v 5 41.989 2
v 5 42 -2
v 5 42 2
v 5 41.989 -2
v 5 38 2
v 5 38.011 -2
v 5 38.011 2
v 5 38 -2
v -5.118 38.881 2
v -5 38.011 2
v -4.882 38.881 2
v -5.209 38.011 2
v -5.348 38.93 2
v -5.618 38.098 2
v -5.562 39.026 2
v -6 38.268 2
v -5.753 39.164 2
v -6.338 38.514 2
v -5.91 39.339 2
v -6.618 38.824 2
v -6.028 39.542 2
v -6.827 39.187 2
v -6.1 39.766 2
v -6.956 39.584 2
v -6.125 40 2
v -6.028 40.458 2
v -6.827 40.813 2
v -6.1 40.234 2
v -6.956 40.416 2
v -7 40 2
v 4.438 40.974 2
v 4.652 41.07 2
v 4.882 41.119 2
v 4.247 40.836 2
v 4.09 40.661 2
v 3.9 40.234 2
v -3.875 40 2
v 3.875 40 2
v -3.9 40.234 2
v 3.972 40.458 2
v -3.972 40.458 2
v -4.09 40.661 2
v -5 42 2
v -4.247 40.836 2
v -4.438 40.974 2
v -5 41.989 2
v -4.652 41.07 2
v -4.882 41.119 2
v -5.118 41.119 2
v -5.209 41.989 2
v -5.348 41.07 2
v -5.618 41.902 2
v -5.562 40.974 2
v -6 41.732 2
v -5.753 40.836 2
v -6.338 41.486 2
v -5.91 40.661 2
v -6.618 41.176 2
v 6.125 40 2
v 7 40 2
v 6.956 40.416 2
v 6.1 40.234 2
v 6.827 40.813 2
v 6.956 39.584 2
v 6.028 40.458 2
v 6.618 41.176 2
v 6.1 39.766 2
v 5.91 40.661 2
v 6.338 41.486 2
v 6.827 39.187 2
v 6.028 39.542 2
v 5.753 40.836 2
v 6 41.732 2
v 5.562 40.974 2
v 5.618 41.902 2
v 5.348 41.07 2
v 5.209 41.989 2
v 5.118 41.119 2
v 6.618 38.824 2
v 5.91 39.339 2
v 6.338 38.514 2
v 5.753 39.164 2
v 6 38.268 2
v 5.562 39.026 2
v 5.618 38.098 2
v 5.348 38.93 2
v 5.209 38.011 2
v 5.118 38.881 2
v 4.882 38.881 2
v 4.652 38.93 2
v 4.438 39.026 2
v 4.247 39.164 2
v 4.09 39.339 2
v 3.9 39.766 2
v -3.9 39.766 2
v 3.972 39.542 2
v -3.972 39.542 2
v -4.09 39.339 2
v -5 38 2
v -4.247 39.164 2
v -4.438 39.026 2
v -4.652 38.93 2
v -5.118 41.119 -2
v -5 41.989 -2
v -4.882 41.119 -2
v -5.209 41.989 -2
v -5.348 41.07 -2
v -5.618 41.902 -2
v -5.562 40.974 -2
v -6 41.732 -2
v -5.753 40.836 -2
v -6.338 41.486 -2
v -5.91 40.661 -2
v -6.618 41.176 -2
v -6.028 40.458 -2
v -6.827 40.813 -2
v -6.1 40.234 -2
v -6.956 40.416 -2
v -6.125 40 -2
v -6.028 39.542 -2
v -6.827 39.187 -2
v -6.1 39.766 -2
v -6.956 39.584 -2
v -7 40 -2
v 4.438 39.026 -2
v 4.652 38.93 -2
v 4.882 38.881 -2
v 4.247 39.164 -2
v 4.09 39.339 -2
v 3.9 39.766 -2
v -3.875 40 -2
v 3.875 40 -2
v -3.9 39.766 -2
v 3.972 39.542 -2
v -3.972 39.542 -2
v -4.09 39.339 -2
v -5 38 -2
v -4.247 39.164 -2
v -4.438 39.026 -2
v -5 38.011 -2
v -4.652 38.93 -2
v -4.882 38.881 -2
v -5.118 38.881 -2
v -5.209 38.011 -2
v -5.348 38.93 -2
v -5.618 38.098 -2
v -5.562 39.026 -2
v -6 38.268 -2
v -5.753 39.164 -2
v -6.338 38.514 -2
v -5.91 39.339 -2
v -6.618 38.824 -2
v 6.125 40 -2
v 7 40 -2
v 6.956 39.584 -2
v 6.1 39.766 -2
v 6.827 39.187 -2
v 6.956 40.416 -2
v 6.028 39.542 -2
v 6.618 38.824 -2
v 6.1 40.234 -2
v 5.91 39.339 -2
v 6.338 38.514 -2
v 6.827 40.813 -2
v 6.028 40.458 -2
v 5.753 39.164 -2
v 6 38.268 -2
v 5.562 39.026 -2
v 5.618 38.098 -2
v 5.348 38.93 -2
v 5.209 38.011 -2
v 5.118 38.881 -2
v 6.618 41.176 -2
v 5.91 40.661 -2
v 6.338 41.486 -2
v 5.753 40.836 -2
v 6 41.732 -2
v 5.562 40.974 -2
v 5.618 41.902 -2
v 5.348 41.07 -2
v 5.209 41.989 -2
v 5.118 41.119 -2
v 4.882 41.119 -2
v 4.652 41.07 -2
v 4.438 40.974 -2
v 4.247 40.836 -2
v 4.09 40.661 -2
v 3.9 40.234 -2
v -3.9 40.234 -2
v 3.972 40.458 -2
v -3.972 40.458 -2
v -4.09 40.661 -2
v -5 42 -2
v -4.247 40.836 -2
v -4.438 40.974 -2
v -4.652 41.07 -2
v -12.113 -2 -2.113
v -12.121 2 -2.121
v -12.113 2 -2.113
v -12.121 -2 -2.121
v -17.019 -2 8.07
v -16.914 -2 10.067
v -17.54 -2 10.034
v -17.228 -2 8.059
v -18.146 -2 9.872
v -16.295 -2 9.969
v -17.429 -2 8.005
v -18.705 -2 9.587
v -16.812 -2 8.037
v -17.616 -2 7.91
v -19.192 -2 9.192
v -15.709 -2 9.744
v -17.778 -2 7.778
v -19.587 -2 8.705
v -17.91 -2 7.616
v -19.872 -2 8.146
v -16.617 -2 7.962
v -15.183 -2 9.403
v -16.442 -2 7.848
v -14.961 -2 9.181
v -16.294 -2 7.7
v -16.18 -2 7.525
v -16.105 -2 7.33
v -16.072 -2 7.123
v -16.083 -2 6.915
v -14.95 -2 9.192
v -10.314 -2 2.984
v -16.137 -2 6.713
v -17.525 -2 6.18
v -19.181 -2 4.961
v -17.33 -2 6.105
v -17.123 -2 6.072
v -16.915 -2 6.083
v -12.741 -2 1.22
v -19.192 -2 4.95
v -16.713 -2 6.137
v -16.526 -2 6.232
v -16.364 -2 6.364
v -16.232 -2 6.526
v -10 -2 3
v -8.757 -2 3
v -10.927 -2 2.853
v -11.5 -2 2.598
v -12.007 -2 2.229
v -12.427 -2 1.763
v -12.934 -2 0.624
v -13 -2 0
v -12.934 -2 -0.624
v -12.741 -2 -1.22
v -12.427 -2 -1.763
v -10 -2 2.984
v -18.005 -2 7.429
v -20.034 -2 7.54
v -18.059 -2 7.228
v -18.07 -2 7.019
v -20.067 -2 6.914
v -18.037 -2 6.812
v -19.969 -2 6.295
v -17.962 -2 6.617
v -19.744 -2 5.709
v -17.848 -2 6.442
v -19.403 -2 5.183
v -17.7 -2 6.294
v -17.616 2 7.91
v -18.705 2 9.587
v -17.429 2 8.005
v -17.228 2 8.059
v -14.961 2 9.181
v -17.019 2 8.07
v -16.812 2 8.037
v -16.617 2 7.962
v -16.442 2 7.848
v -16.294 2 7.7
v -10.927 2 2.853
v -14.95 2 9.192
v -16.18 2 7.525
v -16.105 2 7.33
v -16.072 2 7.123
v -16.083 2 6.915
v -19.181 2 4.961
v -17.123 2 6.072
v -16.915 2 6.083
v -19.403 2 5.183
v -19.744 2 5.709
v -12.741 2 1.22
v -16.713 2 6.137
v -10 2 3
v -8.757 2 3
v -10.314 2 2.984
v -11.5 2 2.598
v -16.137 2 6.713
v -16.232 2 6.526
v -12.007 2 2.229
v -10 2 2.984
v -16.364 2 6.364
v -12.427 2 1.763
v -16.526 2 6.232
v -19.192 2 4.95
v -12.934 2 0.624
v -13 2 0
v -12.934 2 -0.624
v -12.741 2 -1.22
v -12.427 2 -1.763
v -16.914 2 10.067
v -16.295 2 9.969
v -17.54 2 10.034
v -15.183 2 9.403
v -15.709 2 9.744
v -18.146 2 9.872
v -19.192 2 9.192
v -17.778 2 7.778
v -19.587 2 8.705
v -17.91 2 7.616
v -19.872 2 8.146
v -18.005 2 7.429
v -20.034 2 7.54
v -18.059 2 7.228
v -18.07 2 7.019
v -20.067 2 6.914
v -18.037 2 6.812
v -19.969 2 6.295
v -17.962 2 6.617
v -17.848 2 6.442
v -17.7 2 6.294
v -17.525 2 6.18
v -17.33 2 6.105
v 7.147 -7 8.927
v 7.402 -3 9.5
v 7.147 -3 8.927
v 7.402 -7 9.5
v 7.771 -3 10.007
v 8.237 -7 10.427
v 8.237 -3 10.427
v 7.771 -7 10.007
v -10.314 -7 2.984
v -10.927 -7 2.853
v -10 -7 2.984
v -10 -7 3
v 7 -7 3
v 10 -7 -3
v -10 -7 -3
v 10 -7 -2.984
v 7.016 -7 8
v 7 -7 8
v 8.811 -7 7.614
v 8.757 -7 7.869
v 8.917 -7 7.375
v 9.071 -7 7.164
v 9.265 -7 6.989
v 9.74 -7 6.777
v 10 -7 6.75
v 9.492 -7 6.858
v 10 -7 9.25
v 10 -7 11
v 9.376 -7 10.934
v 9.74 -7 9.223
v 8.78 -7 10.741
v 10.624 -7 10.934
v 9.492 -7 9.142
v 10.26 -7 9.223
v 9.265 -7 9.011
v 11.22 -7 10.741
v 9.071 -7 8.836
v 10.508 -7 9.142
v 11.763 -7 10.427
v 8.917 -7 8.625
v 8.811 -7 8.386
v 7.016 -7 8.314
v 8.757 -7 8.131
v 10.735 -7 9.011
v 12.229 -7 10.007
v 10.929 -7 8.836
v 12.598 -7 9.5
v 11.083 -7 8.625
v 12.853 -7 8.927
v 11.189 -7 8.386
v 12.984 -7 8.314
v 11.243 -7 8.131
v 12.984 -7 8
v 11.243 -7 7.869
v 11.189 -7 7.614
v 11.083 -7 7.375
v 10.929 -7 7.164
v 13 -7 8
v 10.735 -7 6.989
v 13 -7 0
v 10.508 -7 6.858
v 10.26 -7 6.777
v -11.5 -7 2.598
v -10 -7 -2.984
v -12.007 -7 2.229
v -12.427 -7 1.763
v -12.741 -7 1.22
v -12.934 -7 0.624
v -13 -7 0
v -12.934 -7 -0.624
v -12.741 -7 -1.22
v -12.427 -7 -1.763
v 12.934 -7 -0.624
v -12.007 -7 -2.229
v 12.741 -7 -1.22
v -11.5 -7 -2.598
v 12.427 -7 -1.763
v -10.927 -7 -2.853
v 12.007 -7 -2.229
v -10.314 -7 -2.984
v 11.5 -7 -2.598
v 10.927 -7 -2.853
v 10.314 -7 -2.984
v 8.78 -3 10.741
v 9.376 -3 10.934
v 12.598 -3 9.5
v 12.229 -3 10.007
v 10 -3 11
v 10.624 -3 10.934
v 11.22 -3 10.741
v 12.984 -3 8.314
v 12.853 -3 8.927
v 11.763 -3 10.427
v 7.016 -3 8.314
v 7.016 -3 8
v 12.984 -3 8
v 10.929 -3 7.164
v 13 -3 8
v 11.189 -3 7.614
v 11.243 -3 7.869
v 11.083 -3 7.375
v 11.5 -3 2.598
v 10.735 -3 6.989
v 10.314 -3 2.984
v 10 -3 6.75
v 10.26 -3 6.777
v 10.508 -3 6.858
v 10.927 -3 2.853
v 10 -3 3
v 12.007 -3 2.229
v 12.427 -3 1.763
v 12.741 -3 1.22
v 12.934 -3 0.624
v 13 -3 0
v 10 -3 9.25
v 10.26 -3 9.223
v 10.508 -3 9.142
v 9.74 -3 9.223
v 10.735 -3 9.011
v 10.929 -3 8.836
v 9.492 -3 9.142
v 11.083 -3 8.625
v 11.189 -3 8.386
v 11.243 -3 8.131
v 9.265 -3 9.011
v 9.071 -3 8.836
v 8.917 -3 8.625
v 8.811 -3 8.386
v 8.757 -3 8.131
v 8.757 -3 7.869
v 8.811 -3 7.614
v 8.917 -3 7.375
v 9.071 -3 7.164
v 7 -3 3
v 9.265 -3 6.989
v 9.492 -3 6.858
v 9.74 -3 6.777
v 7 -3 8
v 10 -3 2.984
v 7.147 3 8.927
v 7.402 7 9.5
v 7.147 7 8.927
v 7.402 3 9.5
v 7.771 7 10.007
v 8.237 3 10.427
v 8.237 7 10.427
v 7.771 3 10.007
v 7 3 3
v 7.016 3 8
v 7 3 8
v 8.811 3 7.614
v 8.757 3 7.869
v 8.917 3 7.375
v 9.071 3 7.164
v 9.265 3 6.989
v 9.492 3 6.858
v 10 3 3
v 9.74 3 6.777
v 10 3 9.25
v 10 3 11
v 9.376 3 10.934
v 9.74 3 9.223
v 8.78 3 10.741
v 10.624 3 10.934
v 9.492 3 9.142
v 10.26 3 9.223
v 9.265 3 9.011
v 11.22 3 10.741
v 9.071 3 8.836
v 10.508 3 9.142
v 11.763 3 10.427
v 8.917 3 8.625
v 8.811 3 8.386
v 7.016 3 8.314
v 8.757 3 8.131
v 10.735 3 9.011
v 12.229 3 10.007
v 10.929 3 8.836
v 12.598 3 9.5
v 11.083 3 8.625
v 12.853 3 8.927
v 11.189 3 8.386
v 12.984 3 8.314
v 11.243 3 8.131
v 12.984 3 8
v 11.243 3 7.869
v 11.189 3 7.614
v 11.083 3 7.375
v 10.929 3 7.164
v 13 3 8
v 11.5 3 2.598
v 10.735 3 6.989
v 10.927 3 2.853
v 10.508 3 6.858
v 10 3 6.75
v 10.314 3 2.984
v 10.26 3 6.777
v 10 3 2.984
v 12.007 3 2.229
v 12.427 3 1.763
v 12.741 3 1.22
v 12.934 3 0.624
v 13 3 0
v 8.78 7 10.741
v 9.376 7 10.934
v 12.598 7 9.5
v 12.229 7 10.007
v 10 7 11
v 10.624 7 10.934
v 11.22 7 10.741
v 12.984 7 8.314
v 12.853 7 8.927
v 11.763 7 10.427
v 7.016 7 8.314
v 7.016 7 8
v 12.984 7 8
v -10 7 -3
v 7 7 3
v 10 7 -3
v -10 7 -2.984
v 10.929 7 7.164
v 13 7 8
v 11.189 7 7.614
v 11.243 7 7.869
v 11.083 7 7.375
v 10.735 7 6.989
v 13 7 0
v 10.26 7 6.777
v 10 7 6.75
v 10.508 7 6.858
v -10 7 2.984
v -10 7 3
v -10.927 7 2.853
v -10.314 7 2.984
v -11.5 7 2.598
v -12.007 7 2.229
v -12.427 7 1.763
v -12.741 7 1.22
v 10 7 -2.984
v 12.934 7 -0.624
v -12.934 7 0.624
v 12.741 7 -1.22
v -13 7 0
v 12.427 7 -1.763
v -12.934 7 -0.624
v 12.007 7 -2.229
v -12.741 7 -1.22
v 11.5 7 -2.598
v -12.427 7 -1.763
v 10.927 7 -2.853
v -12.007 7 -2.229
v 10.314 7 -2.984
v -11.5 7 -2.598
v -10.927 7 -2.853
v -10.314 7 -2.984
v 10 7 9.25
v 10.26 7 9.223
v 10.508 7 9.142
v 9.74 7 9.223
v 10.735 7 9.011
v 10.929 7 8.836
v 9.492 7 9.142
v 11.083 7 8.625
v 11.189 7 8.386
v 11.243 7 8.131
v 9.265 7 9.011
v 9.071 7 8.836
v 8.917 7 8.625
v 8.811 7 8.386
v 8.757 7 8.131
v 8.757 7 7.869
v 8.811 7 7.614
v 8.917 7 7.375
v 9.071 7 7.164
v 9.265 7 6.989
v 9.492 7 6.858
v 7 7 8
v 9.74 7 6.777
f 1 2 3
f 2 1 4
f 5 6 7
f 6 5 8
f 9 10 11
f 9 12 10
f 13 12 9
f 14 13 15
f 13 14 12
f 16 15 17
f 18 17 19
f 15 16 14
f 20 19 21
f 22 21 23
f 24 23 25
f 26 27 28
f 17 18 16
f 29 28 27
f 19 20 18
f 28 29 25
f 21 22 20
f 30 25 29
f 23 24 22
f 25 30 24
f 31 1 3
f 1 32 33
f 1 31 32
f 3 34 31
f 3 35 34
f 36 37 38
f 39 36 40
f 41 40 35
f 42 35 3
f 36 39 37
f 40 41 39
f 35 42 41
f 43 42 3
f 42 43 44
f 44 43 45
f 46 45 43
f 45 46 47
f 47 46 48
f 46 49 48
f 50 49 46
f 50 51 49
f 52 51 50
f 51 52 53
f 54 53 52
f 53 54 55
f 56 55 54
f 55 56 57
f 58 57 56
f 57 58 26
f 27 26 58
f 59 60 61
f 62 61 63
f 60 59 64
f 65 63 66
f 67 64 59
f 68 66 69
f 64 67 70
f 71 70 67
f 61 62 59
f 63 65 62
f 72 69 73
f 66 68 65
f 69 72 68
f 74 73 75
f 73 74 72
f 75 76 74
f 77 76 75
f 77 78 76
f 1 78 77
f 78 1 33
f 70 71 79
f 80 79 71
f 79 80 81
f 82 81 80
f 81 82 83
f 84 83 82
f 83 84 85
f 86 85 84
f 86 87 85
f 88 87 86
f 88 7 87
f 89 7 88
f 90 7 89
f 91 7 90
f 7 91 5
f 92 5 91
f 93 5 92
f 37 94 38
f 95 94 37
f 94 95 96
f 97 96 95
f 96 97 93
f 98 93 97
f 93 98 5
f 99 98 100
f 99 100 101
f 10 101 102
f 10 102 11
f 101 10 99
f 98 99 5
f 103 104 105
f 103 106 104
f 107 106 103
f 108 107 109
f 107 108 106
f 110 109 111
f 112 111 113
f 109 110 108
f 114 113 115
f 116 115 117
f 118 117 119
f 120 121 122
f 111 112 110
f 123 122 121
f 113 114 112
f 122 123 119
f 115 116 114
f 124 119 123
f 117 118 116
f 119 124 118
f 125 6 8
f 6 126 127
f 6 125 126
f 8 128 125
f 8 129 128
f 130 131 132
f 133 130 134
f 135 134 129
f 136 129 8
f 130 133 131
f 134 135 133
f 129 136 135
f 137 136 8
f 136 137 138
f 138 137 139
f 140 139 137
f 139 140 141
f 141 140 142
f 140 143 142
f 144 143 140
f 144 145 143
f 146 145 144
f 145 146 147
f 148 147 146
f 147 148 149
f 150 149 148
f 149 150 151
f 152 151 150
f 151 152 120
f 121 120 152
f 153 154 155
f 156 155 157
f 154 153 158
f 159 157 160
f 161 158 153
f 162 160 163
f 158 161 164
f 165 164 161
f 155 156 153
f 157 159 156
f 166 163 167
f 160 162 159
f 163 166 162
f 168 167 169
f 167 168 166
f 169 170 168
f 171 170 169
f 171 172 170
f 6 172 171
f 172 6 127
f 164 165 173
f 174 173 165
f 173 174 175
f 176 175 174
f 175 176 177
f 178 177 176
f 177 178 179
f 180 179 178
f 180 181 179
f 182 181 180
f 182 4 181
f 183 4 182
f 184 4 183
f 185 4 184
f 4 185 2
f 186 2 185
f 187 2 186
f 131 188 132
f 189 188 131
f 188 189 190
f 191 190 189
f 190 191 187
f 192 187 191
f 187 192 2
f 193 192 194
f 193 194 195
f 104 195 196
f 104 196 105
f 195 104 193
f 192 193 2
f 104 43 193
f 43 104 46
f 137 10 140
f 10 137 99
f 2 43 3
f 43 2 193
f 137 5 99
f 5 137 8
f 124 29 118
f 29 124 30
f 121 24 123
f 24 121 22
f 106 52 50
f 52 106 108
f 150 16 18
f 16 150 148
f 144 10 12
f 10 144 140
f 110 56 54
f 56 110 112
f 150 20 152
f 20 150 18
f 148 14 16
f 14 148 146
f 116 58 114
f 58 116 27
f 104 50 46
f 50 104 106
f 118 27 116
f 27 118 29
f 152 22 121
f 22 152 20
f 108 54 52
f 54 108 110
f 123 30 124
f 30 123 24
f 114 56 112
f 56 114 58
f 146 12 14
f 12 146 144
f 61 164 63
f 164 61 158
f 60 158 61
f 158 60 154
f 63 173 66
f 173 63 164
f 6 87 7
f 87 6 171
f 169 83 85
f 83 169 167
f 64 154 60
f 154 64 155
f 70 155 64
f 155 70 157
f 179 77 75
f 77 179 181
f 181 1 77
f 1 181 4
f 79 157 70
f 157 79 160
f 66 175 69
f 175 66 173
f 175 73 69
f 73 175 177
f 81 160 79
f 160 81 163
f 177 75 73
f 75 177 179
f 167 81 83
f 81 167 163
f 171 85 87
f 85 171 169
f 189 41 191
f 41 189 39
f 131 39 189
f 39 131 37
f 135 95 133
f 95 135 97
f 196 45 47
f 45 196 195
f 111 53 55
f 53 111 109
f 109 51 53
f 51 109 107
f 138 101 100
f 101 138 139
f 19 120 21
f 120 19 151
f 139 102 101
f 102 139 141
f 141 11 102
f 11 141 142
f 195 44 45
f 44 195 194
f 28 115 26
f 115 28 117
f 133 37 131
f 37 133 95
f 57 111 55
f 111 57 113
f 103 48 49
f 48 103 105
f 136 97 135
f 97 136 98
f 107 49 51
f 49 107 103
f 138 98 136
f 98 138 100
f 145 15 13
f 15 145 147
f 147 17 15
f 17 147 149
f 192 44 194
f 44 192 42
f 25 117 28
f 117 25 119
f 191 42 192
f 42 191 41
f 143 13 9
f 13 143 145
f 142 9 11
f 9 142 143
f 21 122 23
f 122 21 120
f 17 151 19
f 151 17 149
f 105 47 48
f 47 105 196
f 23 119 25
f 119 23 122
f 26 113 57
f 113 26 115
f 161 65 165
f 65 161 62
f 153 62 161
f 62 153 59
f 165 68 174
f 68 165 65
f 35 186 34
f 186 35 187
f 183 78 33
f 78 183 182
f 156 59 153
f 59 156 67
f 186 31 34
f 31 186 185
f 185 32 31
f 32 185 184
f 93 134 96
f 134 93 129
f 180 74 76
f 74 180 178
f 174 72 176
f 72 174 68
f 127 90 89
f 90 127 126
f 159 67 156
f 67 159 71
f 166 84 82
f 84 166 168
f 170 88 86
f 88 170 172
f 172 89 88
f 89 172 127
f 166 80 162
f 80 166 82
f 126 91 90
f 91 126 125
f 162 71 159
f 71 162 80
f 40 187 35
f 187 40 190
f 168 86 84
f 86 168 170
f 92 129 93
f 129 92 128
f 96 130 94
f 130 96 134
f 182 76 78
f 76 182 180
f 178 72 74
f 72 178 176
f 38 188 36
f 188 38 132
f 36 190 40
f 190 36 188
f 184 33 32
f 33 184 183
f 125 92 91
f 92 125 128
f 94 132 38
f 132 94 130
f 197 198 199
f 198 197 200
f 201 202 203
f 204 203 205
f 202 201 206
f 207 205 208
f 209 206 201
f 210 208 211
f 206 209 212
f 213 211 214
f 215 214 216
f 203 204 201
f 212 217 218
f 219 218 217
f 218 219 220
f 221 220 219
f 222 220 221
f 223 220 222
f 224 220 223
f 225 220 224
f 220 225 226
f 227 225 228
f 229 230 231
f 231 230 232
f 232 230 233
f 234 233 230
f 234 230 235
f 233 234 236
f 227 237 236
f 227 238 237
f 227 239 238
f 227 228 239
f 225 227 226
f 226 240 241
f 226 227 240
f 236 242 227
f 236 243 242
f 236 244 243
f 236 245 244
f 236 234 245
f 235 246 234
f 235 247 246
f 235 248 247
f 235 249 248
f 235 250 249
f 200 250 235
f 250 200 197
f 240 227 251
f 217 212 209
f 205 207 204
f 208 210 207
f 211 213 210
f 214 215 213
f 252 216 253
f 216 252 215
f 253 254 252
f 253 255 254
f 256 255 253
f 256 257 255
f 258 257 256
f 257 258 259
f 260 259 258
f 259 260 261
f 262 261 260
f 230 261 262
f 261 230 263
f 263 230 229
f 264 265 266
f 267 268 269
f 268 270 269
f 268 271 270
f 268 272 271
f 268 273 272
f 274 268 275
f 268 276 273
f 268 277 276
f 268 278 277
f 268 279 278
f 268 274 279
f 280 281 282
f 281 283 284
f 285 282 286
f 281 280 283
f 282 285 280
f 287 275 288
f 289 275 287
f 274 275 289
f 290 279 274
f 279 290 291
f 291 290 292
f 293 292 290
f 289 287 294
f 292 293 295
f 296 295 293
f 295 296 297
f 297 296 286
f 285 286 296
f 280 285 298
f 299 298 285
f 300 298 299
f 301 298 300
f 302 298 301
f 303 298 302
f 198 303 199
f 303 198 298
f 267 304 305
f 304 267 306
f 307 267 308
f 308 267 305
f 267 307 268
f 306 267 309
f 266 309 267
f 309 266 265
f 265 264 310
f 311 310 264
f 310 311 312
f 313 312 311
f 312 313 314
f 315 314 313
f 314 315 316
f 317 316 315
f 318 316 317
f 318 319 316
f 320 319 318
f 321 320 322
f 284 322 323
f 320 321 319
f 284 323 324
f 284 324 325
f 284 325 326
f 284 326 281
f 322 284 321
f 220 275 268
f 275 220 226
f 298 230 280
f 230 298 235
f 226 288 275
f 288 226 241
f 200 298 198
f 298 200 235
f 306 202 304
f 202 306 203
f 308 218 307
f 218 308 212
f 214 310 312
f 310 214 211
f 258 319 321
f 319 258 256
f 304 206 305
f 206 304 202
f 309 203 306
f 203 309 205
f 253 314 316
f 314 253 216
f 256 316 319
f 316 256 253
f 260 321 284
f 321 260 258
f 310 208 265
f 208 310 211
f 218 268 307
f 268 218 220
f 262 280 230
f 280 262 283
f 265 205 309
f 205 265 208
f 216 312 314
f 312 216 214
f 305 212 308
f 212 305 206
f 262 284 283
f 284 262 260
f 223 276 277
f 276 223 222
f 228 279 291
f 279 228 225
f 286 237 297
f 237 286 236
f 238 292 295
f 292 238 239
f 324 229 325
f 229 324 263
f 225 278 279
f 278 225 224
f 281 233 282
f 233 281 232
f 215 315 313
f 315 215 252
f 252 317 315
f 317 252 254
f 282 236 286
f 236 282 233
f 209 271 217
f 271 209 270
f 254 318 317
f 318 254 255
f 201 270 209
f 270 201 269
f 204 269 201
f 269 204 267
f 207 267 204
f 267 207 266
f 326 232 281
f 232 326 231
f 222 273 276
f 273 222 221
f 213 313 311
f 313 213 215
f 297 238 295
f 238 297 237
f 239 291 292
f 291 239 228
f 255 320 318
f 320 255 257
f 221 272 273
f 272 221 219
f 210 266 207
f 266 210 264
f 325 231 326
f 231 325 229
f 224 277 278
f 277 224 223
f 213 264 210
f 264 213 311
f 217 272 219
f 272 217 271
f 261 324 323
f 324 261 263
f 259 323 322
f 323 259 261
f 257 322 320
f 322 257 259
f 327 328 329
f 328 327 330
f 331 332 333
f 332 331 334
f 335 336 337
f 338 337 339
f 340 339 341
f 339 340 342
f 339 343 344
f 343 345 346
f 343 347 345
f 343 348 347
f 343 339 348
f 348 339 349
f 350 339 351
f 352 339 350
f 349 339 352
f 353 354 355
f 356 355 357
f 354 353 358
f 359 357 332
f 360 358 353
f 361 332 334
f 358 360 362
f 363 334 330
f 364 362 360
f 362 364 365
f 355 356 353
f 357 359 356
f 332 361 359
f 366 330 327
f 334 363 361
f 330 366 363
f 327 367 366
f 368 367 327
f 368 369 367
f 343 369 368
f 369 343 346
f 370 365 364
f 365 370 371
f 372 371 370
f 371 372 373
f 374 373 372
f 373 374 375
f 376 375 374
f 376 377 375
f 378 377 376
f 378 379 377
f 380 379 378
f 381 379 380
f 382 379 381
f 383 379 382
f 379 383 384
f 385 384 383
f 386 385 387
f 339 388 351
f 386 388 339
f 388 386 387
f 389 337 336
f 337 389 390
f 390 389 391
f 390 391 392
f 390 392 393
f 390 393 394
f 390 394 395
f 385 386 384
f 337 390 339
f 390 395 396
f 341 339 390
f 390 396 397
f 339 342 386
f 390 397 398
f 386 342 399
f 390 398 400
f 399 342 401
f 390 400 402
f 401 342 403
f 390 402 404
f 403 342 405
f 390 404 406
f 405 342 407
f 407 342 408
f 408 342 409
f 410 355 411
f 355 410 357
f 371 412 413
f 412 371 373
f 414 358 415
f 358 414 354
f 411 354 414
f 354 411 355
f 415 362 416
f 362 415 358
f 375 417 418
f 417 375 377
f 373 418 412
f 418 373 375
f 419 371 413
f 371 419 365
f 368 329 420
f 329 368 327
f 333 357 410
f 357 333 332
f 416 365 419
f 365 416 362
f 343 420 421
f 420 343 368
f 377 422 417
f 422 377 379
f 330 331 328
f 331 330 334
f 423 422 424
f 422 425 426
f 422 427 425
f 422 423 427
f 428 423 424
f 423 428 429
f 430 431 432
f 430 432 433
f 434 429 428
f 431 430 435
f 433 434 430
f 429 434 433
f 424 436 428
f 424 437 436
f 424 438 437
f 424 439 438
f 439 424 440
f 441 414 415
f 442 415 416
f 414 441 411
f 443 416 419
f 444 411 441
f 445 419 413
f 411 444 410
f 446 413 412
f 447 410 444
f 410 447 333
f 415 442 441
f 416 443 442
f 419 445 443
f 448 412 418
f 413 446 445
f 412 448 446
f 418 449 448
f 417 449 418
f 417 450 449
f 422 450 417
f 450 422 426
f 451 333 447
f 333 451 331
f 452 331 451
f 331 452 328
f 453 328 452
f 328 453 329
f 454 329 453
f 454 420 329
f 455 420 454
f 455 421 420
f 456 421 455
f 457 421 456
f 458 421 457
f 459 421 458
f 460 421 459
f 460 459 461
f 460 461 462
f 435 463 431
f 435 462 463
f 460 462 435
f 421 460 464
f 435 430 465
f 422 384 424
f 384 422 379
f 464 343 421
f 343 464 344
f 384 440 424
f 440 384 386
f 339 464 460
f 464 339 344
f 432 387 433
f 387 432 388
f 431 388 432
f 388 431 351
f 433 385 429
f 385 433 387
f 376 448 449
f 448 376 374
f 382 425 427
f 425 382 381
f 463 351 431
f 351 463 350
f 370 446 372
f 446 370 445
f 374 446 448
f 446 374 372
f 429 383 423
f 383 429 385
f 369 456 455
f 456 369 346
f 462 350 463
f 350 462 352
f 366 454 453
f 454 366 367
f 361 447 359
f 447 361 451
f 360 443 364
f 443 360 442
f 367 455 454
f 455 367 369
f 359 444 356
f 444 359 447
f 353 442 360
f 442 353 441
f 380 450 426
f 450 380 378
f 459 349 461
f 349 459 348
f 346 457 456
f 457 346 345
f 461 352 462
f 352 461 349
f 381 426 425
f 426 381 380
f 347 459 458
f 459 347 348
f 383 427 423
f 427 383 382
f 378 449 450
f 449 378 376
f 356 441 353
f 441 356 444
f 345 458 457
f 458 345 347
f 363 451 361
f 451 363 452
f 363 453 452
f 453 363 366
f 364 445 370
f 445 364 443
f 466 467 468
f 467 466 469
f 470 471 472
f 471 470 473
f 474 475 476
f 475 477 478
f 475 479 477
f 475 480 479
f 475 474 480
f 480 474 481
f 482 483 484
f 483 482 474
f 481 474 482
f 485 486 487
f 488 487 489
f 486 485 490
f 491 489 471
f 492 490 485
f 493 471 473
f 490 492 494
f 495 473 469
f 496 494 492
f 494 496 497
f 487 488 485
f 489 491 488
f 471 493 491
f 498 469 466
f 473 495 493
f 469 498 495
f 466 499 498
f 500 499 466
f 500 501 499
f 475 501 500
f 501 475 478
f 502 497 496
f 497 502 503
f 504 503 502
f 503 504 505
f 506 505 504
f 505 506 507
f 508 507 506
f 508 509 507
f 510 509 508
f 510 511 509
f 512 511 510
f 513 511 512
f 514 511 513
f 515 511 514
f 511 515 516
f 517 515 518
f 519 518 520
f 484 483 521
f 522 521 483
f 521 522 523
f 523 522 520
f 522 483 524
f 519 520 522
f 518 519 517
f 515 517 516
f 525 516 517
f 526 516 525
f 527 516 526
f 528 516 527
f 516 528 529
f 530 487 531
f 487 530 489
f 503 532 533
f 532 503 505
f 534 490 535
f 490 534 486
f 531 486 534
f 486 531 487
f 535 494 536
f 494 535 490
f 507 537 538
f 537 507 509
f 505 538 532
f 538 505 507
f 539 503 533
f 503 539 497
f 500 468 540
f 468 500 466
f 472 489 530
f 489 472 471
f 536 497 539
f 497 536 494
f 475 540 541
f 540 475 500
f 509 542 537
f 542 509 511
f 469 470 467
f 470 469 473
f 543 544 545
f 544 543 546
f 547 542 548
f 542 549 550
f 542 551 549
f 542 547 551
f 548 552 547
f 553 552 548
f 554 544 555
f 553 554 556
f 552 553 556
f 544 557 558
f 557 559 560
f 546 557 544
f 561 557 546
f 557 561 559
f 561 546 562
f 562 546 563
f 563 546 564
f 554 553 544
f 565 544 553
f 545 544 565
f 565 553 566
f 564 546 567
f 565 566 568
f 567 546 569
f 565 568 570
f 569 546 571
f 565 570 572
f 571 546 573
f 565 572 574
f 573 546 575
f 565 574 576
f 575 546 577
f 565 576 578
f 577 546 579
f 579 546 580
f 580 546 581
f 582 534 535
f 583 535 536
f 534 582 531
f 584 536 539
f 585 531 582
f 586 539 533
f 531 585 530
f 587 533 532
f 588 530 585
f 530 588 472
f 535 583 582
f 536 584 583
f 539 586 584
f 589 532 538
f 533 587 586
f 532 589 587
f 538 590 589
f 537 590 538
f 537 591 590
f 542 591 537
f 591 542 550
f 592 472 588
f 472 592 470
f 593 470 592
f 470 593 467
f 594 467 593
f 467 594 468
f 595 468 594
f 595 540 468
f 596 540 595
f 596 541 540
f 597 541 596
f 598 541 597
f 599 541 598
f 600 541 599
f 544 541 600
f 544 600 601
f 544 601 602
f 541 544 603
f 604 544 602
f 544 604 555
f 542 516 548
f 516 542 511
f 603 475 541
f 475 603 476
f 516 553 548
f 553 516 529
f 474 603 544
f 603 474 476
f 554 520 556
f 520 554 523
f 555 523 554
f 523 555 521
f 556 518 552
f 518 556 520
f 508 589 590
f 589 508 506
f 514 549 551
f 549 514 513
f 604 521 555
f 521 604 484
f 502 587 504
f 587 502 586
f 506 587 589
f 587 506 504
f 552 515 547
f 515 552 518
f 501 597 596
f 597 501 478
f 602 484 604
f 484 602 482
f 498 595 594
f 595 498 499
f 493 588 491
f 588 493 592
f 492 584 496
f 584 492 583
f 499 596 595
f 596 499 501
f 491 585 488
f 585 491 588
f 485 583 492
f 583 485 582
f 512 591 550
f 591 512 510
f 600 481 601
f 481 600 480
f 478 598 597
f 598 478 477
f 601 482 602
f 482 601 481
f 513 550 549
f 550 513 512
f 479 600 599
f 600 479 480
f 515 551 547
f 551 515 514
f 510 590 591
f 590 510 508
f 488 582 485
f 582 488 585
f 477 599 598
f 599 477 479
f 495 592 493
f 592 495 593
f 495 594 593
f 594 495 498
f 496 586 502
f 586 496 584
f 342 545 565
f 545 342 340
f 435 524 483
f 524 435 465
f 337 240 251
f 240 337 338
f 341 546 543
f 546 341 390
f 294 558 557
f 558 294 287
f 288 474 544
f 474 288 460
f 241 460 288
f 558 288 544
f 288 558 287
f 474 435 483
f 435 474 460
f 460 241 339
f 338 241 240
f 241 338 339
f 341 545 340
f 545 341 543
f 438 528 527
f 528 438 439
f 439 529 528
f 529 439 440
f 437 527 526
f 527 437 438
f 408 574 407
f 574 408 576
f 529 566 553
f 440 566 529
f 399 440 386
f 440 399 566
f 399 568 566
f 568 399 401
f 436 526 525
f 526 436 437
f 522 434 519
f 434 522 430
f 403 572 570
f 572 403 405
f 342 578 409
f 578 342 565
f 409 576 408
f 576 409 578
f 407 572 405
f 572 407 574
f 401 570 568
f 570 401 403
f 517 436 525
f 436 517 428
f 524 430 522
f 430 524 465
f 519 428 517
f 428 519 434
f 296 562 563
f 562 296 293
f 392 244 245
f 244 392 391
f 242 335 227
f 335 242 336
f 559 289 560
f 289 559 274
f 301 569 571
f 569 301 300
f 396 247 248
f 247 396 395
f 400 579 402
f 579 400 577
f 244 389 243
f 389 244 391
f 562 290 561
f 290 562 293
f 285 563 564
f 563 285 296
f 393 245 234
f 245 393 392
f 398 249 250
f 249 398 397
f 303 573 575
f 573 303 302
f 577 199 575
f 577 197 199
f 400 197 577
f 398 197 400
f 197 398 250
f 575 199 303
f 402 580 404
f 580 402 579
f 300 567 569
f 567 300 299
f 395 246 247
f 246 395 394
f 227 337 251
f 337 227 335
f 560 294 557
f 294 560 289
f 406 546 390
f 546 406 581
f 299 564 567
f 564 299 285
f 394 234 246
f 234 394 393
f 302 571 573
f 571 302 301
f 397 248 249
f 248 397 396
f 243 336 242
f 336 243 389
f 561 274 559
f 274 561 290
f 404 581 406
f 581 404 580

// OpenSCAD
// license: cc0
//

$fs=0.1;

THICKNESS=4;

INNER_W = 20;
INNER_H = 6;

ARM_W = 14;
ARM_L = 8;
ARM_dw = 2 + THICKNESS*2;
ARM_dout = 6;
ARM_dinn=2.5;
ARM_H = INNER_H/2;

BASE_W = 30;

SHAFT_W = 5;

OUTER_W = 20;
OUTER_w = 15;
OUTER_H = 6;



module _prong() {
  _h = THICKNESS;
  _d_out = ARM_dout;
  _d_inn = ARM_dinn;

  _len = ARM_L;

  difference() {
    union() {
      cylinder(_h, d=_d_out, center=true);
      translate([_len/2, 0, 0]) cube([_len, _d_out, _h], center=true);
    }
    cylinder(_h+1, d=_d_inn, center=true);
  }

}

module _prong2() {
  _w = ARM_dw;
  rotate(90, [1,0,0])
  union() {
    translate([0,0, _w/2]) _prong();
    translate([0,0,-_w/2]) _prong();
  }
}

module middle_shaft() {
  difference() {
    union() {
      hull() {
        cube([INNER_W, ARM_W, INNER_H], center=true);
        cube([ARM_W, INNER_W, INNER_H], center=true);
        rotate(45, [0,0,1]) cube([INNER_W, ARM_W, INNER_H], center=true);
        rotate(-45, [0,0,1]) cube([INNER_W, ARM_W, INNER_H], center=true);
      }
      //translate([
    }
    rotate(45,[0,0,1]) cube([SHAFT_W, SHAFT_W, INNER_H+1], center=true);
    cube([SHAFT_W, SHAFT_W, INNER_H+1], center=true);
  }
}

module bottom_base() {
  _W = OUTER_W;
  _w = OUTER_w;
  _hole_r = 3.1/2;
  _mw = (2/5)*_w;
  _shaft = SHAFT_W + 0.125;
  difference() {
    union() {
      hull() {
        cube([_W, _w, OUTER_H], center=true);
        cube([_w, _W, OUTER_H], center=true);
        rotate(45, [0,0,1]) cube([_W, _w, OUTER_H], center=true);
        rotate(-45, [0,0,1]) cube([_W, _w, OUTER_H], center=true);
      }
      //translate([
    }
    //rotate(45,[0,0,1]) cube([SHAFT_W, SHAFT_W, OUTER_H+1], center=true);
    cube([_shaft, _shaft, OUTER_H+1], center=true);

    translate([-_mw, _mw, 0]) cylinder(OUTER_H+1, r=_hole_r, center=true);
    translate([-_mw,-_mw, 0]) cylinder(OUTER_H+1, r=_hole_r, center=true);
    translate([ _mw,-_mw, 0]) cylinder(OUTER_H+1, r=_hole_r, center=true);
    translate([ _mw, _mw, 0]) cylinder(OUTER_H+1, r=_hole_r, center=true);
  }  
}

module conn(_len) {
  //_len = 40;
  _w = THICKNESS;
  _r = 2.25/2;
  difference() {
    union() {
      cube([_len, _w, _w], center=true);
      translate([-_len/2,0,0]) cylinder(_w, d=_w, center=true);
      translate([ _len/2,0,0]) cylinder(_w, d=_w, center=true);
    }
    translate([-_len/2, 0, 0]) cylinder(_w+1, r=_r, center=true);
    translate([ _len/2, 0, 0]) cylinder(_w+1, r=_r, center=true);

  }
}

module arm() {
  _l0 = 20;
  _l1 =10;
  _t = THICKNESS;
  _w = 6;

  _hole_r = 2.25/2;

  _backbone_w = _t*3.5;
  _xx=8;
  
  cube([_l0, _w, _backbone_w], center=true);

  difference() {
    translate([-_l0/2, 0, 0])
      rotate(-45, [0,0,1])
      
      union() {
        translate([-_l1/2,0,0])
          cube([_l1,_w,_t], center=true);
        translate([-_l1,0,0]) cylinder(_t, d=_w, center=true);
        //cylinder(_t, d=_w, center=true);
       
      }
    translate([-_l0/2, 0, 0])
      rotate(-45, [0,0,1])
      translate([-_l1,0,0]) 
      cylinder(_t+1, _r=_hole_r, center=true);
  }

  translate([_l0/2,_xx,0]) rotate(90,[0,1,0]) rotate(-90, [0,0,1]) _prong2();

  translate([_l0/2,0,0]) cylinder(_backbone_w, d=_w, center=true);
  translate([-_l0/2,0,0]) cylinder(_backbone_w, d=_w, center=true);
    
  
}


module foo() {
  _arm_ds = ARM_L + INNER_W/2;
  middle_shaft();
  translate([-_arm_ds,0,0])  _prong2();
  rotate(180, [0,0,1]) translate([-_arm_ds,0,0])  _prong2();
  rotate(90, [0,0,1]) translate([-_arm_ds,0,0])  _prong2();
  rotate(-90, [0,0,1]) translate([-_arm_ds,0,0])  _prong2();
}

module bar() {
  _arm_ds = ARM_L +  OUTER_W/2;
  bottom_base();
  rotate(0, [0,0,1]) translate([-_arm_ds,0,0])  _prong2();
  rotate(-45, [0,0,1]) translate([-_arm_ds,0,0])  _prong2();
  rotate(-90, [0,0,1]) translate([-_arm_ds,0,0])  _prong2();
  rotate(-90-45, [0,0,1]) translate([-_arm_ds,0,0])  _prong2();
  rotate(180, [0,0,1]) translate([-_arm_ds,0,0])  _prong2();
  rotate(180-45, [0,0,1]) translate([-_arm_ds,0,0])  _prong2();
  rotate(90, [0,0,1]) translate([-_arm_ds,0,0])  _prong2();
  rotate(45, [0,0,1]) translate([-_arm_ds,0,0])  _prong2();
}


module bar0() {
  _arm_ds = ARM_L +  OUTER_W/2;
  bottom_base();
  rotate(0, [0,0,1]) translate([-_arm_ds,0,0])  _prong2();
  //rotate(-45, [0,0,1]) translate([-_arm_ds,0,0])  _prong2();
  rotate(-90, [0,0,1]) translate([-_arm_ds,0,0])  _prong2();
  //rotate(-90-45, [0,0,1]) translate([-_arm_ds,0,0])  _prong2();
  rotate(180, [0,0,1]) translate([-_arm_ds,0,0])  _prong2();
  //rotate(180-45, [0,0,1]) translate([-_arm_ds,0,0])  _prong2();
  rotate(90, [0,0,1]) translate([-_arm_ds,0,0])  _prong2();
  //rotate(45, [0,0,1]) translate([-_arm_ds,0,0])  _prong2();
}

module bar1() {
  _arm_ds = ARM_L +  OUTER_W/2;
  bottom_base();
  //rotate(0, [0,0,1]) translate([-_arm_ds,0,0])  _prong2();
  rotate(-45, [0,0,1]) translate([-_arm_ds,0,0])  _prong2();
  //rotate(-90, [0,0,1]) translate([-_arm_ds,0,0])  _prong2();
  rotate(-90-45, [0,0,1]) translate([-_arm_ds,0,0])  _prong2();
  //rotate(180, [0,0,1]) translate([-_arm_ds,0,0])  _prong2();
  rotate(180-45, [0,0,1]) translate([-_arm_ds,0,0])  _prong2();
  //rotate(90, [0,0,1]) translate([-_arm_ds,0,0])  _prong2();
  rotate(45, [0,0,1]) translate([-_arm_ds,0,0])  _prong2();
}

translate([0,40,0]) conn(10);
rotate(90, [1,0,0]) arm();

//bar0();
//translate([0,0,10]) bar1();

//translate([0,0,20]) foo();
